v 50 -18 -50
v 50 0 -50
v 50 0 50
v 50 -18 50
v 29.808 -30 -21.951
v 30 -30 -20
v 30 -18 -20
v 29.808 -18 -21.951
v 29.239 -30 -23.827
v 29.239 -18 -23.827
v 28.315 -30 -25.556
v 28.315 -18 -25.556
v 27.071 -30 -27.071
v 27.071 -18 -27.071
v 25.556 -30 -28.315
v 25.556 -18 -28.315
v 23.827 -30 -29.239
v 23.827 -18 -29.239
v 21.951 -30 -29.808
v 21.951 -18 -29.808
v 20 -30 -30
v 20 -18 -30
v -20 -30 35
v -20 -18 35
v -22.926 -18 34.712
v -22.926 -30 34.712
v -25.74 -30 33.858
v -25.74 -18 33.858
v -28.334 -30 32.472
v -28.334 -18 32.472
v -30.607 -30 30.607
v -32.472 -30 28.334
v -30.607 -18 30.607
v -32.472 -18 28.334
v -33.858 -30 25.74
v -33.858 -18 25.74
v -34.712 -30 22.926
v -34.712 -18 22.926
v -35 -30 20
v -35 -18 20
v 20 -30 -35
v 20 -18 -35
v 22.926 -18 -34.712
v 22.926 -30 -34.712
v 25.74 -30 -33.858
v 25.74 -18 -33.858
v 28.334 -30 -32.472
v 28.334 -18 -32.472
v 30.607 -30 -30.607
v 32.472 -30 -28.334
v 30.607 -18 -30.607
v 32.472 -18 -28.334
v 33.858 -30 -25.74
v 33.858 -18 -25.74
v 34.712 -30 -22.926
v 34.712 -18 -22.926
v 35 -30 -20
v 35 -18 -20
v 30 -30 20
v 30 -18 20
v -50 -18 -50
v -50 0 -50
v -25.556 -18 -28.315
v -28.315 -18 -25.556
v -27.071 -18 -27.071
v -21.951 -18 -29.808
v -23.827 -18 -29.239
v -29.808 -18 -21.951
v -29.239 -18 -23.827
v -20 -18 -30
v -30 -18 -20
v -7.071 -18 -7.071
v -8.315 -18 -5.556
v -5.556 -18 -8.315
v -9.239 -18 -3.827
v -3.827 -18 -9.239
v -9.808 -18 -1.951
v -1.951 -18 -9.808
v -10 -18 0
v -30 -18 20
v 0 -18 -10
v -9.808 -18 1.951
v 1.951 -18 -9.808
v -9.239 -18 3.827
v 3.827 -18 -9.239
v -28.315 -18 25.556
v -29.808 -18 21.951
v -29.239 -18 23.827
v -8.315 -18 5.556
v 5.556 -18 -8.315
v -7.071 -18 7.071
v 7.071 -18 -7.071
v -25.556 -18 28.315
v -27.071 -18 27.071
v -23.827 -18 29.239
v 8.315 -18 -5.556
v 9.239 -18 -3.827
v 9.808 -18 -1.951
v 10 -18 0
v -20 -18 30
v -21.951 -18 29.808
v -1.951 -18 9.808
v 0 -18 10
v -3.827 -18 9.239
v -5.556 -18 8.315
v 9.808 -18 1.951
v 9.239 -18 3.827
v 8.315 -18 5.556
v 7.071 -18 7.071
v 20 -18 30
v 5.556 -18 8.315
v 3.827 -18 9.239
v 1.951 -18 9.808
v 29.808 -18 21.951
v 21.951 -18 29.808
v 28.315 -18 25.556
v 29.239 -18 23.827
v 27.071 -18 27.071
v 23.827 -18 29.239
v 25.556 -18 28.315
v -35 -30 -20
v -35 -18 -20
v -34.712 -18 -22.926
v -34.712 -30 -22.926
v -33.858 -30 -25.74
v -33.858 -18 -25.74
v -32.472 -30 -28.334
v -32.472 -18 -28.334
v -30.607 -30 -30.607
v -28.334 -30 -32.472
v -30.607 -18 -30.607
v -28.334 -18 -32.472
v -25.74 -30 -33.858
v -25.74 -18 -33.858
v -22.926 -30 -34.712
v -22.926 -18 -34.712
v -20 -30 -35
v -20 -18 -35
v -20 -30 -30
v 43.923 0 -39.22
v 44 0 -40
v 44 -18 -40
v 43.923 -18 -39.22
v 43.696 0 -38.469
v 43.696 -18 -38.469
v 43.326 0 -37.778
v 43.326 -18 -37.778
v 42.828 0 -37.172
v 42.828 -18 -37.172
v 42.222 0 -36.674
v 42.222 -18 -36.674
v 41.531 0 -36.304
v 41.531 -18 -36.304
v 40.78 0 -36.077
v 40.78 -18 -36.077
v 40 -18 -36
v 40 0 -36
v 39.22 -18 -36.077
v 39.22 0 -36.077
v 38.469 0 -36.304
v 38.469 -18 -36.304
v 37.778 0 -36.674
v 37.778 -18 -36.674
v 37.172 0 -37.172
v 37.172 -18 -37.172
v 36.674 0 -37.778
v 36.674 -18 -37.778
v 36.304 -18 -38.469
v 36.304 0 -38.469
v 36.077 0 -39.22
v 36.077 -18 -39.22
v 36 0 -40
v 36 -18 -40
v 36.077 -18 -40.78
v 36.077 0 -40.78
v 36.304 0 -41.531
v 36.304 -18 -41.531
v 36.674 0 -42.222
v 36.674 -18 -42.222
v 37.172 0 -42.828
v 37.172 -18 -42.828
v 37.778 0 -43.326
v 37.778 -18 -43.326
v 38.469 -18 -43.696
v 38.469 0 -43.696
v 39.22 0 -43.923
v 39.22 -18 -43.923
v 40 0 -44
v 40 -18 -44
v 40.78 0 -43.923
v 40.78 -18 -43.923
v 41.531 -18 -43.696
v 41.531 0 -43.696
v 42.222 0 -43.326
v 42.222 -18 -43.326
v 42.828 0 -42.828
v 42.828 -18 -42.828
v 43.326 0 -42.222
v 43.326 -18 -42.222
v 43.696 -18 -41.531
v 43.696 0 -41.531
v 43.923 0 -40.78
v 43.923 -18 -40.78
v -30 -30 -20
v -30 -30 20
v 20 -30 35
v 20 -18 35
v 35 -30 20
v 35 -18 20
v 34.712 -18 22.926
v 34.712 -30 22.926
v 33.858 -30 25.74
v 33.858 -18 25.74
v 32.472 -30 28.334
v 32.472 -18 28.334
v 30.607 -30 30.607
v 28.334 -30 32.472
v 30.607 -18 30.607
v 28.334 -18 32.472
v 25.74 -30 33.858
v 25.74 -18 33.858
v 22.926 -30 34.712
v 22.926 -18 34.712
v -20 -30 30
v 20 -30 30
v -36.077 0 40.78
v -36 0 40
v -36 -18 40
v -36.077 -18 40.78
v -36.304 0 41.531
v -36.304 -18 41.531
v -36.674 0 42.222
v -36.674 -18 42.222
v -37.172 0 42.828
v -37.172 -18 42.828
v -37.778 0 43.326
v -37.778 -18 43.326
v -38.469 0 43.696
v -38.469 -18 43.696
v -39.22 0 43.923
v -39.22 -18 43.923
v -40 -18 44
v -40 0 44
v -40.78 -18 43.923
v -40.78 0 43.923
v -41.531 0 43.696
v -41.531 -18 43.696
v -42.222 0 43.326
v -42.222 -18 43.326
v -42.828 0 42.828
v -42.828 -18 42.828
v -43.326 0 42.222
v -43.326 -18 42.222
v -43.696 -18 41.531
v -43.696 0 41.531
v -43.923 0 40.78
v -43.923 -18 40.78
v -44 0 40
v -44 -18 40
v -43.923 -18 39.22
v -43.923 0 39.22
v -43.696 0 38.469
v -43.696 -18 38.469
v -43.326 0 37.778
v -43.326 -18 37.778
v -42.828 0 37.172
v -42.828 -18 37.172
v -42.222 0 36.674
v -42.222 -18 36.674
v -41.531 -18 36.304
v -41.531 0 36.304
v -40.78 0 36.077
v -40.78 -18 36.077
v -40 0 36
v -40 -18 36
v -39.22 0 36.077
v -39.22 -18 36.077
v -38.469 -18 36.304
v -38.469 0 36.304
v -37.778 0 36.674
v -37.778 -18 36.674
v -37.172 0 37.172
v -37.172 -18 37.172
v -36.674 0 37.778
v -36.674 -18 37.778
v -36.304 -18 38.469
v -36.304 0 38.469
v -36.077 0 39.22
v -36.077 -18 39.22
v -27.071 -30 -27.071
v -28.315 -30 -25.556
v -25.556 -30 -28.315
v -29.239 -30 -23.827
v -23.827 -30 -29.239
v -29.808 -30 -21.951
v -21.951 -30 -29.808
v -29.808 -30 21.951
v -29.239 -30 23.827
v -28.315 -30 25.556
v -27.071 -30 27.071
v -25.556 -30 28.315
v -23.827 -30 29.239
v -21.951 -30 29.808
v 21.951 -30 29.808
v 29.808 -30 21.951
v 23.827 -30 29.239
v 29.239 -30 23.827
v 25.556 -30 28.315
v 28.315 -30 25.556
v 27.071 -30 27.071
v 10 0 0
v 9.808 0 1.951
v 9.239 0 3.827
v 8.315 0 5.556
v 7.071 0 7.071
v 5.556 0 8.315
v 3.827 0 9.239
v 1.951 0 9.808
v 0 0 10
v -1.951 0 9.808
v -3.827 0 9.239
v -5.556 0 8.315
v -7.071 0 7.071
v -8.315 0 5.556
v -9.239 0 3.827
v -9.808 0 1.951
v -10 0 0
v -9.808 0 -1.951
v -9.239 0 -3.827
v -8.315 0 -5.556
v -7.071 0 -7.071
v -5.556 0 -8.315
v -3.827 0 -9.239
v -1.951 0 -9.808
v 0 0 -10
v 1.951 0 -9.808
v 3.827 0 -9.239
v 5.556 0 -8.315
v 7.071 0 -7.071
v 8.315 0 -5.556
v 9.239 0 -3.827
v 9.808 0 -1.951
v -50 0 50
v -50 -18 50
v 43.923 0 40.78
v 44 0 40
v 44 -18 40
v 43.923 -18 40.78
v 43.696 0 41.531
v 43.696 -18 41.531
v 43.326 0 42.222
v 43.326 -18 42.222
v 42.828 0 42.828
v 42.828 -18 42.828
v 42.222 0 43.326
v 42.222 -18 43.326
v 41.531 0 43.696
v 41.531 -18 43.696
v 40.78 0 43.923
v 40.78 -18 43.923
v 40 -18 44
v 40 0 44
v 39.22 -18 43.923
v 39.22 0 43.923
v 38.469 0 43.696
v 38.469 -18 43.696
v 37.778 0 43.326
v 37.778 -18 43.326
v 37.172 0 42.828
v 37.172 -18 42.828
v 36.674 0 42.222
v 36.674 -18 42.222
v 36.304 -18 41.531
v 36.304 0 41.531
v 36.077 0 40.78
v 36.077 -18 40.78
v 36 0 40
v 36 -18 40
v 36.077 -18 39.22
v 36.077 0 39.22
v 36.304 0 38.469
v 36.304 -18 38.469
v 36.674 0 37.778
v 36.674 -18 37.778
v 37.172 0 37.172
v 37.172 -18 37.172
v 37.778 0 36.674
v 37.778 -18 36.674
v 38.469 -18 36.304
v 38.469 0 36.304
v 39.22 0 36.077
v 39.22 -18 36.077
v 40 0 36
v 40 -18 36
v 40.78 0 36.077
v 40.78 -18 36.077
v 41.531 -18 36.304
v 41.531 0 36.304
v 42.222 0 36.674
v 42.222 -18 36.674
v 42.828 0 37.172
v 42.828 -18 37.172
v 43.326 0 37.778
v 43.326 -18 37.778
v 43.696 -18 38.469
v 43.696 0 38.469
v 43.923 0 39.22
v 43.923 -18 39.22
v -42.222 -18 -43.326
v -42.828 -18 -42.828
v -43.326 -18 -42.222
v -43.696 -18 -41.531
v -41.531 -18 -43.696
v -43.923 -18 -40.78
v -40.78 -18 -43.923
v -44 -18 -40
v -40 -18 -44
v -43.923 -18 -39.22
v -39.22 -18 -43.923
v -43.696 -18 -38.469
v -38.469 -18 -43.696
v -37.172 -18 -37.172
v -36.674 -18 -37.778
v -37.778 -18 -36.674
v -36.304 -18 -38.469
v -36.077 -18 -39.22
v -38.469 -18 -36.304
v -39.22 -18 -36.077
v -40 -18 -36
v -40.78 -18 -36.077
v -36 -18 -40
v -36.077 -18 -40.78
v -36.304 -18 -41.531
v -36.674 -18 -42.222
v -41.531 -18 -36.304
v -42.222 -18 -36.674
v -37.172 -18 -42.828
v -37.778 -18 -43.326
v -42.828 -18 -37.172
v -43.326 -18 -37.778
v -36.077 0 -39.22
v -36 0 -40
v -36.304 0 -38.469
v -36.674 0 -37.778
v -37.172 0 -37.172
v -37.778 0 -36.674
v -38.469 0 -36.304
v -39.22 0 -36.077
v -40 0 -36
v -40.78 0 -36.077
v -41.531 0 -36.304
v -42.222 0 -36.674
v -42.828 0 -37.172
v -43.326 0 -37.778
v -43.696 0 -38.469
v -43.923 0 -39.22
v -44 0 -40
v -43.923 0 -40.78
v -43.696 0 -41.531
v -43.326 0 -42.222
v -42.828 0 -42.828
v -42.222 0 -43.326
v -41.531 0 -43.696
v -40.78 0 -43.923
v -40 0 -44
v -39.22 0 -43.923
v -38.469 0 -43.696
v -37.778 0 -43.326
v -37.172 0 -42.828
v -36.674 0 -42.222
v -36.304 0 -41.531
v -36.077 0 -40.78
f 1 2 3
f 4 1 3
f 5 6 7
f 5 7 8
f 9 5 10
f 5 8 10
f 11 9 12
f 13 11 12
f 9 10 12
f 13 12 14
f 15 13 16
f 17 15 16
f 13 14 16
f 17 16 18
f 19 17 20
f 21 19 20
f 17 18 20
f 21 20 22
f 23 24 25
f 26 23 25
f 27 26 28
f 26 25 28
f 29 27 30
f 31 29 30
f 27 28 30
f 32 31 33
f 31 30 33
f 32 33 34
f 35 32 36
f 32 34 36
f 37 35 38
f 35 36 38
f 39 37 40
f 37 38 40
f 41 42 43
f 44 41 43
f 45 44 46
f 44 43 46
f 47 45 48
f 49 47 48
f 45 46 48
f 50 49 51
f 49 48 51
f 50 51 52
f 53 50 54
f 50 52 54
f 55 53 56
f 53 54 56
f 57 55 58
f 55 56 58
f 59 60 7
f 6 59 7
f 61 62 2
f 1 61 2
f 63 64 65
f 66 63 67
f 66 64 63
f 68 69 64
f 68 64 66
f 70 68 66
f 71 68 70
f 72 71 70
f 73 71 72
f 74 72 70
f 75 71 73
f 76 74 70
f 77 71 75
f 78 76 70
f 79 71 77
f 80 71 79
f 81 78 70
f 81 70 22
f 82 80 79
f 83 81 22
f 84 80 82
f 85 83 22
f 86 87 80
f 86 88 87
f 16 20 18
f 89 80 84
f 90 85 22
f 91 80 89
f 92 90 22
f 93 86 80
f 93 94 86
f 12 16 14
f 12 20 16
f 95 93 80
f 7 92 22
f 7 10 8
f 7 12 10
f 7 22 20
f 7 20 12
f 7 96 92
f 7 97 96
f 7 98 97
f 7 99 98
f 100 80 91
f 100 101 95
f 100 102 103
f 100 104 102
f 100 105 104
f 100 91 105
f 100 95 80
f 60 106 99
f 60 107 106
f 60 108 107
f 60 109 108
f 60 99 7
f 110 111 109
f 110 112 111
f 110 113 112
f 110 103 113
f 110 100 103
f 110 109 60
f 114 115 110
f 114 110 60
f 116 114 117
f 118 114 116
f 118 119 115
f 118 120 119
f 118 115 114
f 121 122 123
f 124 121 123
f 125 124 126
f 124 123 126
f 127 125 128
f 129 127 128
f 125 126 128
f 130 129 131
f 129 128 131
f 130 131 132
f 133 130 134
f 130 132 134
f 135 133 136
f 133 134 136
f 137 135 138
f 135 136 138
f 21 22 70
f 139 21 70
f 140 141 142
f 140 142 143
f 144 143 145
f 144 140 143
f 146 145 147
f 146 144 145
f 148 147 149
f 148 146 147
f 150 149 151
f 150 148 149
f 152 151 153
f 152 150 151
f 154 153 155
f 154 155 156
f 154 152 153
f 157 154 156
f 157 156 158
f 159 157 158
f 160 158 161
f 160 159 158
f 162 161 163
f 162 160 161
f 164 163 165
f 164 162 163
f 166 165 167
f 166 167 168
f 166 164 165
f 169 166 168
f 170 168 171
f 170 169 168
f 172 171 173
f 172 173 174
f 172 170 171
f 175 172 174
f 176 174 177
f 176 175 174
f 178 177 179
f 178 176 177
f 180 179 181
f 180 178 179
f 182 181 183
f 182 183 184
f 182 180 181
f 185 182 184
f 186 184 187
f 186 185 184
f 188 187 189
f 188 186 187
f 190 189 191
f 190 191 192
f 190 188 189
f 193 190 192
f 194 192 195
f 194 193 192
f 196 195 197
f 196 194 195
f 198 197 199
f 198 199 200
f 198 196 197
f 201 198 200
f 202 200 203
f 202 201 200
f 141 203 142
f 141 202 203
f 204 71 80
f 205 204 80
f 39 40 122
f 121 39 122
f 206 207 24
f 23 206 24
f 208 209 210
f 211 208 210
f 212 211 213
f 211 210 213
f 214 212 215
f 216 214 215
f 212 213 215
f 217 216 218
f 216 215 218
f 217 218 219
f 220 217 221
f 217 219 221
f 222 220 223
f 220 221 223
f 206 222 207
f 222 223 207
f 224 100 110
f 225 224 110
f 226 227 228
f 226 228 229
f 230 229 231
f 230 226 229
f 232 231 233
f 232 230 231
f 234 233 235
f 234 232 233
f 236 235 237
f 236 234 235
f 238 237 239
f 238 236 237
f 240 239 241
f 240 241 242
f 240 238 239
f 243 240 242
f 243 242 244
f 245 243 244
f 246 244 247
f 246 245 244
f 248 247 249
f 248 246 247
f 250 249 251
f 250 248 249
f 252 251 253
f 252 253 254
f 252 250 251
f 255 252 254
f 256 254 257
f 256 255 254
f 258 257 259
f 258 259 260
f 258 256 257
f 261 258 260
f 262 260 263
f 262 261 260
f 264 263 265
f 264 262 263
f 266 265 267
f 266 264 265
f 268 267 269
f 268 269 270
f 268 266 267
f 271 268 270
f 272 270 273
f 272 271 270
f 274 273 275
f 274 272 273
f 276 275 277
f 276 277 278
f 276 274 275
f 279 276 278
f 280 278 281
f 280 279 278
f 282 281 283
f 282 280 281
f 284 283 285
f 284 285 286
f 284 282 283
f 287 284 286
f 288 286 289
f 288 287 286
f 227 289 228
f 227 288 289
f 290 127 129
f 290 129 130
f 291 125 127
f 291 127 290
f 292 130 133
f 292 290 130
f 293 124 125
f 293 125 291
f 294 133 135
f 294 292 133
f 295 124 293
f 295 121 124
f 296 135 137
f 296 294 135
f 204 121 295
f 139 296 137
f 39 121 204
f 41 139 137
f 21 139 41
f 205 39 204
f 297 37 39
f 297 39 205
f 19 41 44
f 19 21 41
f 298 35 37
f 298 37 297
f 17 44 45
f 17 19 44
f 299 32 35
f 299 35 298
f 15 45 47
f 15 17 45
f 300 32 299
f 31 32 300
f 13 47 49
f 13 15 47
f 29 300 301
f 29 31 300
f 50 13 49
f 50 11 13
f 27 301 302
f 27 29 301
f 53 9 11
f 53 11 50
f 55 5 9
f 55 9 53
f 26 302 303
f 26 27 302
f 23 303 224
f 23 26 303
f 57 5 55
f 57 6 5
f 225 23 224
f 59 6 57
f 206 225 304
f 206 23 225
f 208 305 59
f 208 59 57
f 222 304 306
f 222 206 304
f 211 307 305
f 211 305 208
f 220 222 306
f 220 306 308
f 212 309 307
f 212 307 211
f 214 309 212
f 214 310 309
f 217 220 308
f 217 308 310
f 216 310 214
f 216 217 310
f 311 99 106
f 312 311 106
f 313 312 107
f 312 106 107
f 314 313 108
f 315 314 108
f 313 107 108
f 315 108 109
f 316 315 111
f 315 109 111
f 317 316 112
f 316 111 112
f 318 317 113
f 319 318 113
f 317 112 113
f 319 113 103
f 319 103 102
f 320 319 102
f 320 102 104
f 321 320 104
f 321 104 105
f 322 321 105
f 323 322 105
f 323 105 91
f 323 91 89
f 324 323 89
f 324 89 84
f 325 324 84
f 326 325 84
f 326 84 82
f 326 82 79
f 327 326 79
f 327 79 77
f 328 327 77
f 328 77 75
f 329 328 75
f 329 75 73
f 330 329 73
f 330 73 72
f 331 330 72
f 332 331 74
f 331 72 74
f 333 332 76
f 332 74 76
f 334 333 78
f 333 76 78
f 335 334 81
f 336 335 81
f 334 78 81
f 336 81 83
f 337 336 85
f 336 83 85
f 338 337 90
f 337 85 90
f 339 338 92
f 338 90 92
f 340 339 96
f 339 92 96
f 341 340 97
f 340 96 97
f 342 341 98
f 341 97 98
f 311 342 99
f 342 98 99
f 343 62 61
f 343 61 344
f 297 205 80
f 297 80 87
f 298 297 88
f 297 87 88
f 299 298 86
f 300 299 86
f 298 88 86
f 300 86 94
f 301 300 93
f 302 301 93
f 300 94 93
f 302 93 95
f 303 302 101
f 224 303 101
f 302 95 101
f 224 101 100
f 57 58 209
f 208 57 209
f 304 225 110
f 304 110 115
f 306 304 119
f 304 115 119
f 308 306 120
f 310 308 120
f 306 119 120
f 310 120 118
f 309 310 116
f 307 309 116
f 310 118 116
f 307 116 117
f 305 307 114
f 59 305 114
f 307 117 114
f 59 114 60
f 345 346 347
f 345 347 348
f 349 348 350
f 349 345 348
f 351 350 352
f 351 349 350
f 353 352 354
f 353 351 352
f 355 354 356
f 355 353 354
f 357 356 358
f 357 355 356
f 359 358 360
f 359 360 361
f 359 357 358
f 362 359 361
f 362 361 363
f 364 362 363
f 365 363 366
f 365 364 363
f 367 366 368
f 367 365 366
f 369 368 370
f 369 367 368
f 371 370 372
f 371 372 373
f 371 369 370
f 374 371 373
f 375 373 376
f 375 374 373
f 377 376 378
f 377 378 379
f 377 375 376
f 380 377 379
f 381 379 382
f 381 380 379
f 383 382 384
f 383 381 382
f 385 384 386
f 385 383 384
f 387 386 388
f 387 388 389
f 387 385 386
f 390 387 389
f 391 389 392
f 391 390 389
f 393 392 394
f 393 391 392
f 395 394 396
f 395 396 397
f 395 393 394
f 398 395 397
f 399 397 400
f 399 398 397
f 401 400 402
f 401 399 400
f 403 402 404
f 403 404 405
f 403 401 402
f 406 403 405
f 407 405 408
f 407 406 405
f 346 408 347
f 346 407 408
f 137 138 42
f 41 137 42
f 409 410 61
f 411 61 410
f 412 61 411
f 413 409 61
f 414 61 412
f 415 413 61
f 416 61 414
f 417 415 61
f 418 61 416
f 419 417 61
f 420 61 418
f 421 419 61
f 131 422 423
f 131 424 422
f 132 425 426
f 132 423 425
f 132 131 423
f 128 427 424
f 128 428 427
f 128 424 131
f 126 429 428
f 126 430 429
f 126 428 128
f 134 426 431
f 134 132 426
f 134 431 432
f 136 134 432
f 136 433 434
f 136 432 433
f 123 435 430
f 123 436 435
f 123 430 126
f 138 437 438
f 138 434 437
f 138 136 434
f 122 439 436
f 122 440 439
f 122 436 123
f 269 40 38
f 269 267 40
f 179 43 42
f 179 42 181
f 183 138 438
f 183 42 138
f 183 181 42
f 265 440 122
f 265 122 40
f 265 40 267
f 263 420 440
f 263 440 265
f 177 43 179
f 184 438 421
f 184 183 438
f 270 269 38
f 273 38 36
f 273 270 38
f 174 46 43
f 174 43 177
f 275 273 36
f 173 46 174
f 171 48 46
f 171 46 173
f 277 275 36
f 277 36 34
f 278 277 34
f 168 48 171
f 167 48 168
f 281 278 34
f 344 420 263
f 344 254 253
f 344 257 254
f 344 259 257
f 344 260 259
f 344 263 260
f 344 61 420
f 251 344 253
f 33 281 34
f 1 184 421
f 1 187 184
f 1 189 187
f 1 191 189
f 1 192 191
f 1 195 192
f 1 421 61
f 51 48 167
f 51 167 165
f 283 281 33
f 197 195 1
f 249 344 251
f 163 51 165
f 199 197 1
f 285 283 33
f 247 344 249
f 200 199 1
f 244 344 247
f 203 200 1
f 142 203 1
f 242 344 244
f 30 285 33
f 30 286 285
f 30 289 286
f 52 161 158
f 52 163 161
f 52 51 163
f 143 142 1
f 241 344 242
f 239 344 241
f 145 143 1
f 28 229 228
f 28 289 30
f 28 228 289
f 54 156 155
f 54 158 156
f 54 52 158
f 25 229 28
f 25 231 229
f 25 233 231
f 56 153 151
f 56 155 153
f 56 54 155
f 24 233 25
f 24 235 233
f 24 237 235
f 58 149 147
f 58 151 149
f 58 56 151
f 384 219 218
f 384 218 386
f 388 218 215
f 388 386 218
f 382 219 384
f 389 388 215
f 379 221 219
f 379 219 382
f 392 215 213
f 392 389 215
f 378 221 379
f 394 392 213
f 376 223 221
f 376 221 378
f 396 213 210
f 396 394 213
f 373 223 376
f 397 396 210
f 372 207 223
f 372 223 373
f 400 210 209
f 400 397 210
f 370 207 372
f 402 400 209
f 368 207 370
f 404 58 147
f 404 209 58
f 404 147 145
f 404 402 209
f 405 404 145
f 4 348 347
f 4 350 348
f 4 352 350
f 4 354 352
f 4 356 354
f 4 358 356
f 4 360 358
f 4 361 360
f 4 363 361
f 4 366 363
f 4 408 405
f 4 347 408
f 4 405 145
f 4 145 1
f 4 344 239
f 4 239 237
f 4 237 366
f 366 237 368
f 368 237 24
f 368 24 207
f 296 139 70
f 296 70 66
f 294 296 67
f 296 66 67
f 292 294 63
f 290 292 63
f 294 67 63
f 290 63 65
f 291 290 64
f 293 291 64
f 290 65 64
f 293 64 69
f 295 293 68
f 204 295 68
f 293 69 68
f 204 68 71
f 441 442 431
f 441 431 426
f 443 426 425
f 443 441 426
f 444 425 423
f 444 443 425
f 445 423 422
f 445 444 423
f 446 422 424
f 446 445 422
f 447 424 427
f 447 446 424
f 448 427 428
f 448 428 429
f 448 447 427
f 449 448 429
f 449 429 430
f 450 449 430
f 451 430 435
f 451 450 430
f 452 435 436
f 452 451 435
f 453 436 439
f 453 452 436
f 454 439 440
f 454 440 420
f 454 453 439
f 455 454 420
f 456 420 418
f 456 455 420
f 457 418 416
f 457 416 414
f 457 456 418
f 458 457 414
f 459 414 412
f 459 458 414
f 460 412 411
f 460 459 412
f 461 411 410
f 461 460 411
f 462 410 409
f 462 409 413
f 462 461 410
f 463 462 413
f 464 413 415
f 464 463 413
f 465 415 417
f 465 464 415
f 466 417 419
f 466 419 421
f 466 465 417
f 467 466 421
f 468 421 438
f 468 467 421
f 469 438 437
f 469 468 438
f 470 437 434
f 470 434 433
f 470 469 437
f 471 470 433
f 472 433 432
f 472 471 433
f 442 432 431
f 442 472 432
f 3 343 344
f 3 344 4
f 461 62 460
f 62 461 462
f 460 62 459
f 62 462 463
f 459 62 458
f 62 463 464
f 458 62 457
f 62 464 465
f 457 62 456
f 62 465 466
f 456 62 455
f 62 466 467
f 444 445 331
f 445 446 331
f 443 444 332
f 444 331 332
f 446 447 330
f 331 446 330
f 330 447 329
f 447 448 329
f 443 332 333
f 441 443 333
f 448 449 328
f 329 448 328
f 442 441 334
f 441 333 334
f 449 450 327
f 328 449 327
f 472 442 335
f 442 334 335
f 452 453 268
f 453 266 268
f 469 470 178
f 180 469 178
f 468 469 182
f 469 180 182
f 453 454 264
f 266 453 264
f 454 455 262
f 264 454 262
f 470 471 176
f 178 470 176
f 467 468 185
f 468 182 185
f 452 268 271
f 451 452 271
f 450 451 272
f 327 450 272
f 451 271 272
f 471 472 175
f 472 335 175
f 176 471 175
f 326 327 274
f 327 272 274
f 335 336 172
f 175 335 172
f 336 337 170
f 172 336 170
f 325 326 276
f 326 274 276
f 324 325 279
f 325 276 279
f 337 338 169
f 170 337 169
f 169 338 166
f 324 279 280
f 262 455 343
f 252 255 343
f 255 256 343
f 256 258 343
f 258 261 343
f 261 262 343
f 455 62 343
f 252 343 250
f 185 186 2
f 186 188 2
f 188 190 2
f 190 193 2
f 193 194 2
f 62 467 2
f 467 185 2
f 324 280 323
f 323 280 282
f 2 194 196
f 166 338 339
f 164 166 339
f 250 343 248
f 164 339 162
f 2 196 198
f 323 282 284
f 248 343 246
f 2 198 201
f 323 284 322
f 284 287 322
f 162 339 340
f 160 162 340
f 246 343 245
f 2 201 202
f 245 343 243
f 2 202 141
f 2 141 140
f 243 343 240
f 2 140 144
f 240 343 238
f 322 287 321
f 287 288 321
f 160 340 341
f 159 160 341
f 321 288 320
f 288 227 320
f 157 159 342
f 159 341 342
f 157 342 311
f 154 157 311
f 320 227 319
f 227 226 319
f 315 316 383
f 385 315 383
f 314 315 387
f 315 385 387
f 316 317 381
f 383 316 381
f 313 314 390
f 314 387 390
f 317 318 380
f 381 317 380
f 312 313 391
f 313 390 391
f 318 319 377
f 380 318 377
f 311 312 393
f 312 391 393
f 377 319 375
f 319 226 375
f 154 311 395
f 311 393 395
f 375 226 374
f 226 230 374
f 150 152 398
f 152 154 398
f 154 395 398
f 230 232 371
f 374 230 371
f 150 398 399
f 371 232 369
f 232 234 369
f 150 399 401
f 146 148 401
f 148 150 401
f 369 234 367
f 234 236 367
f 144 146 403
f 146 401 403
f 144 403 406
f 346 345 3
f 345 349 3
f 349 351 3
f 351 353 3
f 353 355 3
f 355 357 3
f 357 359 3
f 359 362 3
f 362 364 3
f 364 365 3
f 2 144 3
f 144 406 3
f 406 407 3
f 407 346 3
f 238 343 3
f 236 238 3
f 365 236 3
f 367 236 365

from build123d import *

# Parameters (mm, degrees)
F0_W     = 100
F0_H     = 100
F0_R     = 4
F1_DEPTH = 18
F3_DEPTH = 12
F4_R     = 10
F5_DEPTH = 30


with BuildPart() as f1:
    # F0 (on Front) → F1 (new body)
    with BuildSketch(Plane.XZ):
        Rectangle(F0_W, F0_H)
        with Locations((-40, -40)):
            Circle(F0_R, mode=Mode.SUBTRACT)
        with Locations((40, -40)):
            Circle(F0_R, mode=Mode.SUBTRACT)
        with Locations((-40, 40)):
            Circle(F0_R, mode=Mode.SUBTRACT)
        with Locations((40, 40)):
            Circle(F0_R, mode=Mode.SUBTRACT)
    extrude(amount=F1_DEPTH)

    # F2 (on face) → F3 (join)
    with BuildSketch(Plane.XZ.offset(18)):
        with BuildLine():
            Line((20, 35), (-20, 35))
            ThreePointArc((-20, 35), (-30.606602, 30.606602), (-35, 20))
            Line((-35, 20), (-35, -20))
            ThreePointArc((-35, -20), (-30.606602, -30.606602), (-20, -35))
            Line((-20, -35), (20, -35))
            ThreePointArc((20, -35), (30.606602, -30.606602), (35, -20))
            Line((35, -20), (35, 20))
            ThreePointArc((35, 20), (30.606602, 30.606602), (20, 35))
        make_face()
        with BuildLine():
            ThreePointArc((-30, 20), (-27.071068, 27.071068), (-20, 30))
            Line((-20, 30), (20, 30))
            ThreePointArc((20, 30), (27.071068, 27.071068), (30, 20))
            Line((30, 20), (30, -20))
            ThreePointArc((30, -20), (27.071068, -27.071068), (20, -30))
            Line((20, -30), (-20, -30))
            ThreePointArc((-20, -30), (-27.071068, -27.071068), (-30, -20))
            Line((-30, -20), (-30, 20))
        make_face(mode=Mode.SUBTRACT)
    extrude(amount=F3_DEPTH)

    # F4 (on face) → F5 (cut)
    with BuildSketch(Plane.XZ.offset(18)):
        Circle(F4_R)
    extrude(amount=-F5_DEPTH, mode=Mode.SUBTRACT)


solid = f1.part
